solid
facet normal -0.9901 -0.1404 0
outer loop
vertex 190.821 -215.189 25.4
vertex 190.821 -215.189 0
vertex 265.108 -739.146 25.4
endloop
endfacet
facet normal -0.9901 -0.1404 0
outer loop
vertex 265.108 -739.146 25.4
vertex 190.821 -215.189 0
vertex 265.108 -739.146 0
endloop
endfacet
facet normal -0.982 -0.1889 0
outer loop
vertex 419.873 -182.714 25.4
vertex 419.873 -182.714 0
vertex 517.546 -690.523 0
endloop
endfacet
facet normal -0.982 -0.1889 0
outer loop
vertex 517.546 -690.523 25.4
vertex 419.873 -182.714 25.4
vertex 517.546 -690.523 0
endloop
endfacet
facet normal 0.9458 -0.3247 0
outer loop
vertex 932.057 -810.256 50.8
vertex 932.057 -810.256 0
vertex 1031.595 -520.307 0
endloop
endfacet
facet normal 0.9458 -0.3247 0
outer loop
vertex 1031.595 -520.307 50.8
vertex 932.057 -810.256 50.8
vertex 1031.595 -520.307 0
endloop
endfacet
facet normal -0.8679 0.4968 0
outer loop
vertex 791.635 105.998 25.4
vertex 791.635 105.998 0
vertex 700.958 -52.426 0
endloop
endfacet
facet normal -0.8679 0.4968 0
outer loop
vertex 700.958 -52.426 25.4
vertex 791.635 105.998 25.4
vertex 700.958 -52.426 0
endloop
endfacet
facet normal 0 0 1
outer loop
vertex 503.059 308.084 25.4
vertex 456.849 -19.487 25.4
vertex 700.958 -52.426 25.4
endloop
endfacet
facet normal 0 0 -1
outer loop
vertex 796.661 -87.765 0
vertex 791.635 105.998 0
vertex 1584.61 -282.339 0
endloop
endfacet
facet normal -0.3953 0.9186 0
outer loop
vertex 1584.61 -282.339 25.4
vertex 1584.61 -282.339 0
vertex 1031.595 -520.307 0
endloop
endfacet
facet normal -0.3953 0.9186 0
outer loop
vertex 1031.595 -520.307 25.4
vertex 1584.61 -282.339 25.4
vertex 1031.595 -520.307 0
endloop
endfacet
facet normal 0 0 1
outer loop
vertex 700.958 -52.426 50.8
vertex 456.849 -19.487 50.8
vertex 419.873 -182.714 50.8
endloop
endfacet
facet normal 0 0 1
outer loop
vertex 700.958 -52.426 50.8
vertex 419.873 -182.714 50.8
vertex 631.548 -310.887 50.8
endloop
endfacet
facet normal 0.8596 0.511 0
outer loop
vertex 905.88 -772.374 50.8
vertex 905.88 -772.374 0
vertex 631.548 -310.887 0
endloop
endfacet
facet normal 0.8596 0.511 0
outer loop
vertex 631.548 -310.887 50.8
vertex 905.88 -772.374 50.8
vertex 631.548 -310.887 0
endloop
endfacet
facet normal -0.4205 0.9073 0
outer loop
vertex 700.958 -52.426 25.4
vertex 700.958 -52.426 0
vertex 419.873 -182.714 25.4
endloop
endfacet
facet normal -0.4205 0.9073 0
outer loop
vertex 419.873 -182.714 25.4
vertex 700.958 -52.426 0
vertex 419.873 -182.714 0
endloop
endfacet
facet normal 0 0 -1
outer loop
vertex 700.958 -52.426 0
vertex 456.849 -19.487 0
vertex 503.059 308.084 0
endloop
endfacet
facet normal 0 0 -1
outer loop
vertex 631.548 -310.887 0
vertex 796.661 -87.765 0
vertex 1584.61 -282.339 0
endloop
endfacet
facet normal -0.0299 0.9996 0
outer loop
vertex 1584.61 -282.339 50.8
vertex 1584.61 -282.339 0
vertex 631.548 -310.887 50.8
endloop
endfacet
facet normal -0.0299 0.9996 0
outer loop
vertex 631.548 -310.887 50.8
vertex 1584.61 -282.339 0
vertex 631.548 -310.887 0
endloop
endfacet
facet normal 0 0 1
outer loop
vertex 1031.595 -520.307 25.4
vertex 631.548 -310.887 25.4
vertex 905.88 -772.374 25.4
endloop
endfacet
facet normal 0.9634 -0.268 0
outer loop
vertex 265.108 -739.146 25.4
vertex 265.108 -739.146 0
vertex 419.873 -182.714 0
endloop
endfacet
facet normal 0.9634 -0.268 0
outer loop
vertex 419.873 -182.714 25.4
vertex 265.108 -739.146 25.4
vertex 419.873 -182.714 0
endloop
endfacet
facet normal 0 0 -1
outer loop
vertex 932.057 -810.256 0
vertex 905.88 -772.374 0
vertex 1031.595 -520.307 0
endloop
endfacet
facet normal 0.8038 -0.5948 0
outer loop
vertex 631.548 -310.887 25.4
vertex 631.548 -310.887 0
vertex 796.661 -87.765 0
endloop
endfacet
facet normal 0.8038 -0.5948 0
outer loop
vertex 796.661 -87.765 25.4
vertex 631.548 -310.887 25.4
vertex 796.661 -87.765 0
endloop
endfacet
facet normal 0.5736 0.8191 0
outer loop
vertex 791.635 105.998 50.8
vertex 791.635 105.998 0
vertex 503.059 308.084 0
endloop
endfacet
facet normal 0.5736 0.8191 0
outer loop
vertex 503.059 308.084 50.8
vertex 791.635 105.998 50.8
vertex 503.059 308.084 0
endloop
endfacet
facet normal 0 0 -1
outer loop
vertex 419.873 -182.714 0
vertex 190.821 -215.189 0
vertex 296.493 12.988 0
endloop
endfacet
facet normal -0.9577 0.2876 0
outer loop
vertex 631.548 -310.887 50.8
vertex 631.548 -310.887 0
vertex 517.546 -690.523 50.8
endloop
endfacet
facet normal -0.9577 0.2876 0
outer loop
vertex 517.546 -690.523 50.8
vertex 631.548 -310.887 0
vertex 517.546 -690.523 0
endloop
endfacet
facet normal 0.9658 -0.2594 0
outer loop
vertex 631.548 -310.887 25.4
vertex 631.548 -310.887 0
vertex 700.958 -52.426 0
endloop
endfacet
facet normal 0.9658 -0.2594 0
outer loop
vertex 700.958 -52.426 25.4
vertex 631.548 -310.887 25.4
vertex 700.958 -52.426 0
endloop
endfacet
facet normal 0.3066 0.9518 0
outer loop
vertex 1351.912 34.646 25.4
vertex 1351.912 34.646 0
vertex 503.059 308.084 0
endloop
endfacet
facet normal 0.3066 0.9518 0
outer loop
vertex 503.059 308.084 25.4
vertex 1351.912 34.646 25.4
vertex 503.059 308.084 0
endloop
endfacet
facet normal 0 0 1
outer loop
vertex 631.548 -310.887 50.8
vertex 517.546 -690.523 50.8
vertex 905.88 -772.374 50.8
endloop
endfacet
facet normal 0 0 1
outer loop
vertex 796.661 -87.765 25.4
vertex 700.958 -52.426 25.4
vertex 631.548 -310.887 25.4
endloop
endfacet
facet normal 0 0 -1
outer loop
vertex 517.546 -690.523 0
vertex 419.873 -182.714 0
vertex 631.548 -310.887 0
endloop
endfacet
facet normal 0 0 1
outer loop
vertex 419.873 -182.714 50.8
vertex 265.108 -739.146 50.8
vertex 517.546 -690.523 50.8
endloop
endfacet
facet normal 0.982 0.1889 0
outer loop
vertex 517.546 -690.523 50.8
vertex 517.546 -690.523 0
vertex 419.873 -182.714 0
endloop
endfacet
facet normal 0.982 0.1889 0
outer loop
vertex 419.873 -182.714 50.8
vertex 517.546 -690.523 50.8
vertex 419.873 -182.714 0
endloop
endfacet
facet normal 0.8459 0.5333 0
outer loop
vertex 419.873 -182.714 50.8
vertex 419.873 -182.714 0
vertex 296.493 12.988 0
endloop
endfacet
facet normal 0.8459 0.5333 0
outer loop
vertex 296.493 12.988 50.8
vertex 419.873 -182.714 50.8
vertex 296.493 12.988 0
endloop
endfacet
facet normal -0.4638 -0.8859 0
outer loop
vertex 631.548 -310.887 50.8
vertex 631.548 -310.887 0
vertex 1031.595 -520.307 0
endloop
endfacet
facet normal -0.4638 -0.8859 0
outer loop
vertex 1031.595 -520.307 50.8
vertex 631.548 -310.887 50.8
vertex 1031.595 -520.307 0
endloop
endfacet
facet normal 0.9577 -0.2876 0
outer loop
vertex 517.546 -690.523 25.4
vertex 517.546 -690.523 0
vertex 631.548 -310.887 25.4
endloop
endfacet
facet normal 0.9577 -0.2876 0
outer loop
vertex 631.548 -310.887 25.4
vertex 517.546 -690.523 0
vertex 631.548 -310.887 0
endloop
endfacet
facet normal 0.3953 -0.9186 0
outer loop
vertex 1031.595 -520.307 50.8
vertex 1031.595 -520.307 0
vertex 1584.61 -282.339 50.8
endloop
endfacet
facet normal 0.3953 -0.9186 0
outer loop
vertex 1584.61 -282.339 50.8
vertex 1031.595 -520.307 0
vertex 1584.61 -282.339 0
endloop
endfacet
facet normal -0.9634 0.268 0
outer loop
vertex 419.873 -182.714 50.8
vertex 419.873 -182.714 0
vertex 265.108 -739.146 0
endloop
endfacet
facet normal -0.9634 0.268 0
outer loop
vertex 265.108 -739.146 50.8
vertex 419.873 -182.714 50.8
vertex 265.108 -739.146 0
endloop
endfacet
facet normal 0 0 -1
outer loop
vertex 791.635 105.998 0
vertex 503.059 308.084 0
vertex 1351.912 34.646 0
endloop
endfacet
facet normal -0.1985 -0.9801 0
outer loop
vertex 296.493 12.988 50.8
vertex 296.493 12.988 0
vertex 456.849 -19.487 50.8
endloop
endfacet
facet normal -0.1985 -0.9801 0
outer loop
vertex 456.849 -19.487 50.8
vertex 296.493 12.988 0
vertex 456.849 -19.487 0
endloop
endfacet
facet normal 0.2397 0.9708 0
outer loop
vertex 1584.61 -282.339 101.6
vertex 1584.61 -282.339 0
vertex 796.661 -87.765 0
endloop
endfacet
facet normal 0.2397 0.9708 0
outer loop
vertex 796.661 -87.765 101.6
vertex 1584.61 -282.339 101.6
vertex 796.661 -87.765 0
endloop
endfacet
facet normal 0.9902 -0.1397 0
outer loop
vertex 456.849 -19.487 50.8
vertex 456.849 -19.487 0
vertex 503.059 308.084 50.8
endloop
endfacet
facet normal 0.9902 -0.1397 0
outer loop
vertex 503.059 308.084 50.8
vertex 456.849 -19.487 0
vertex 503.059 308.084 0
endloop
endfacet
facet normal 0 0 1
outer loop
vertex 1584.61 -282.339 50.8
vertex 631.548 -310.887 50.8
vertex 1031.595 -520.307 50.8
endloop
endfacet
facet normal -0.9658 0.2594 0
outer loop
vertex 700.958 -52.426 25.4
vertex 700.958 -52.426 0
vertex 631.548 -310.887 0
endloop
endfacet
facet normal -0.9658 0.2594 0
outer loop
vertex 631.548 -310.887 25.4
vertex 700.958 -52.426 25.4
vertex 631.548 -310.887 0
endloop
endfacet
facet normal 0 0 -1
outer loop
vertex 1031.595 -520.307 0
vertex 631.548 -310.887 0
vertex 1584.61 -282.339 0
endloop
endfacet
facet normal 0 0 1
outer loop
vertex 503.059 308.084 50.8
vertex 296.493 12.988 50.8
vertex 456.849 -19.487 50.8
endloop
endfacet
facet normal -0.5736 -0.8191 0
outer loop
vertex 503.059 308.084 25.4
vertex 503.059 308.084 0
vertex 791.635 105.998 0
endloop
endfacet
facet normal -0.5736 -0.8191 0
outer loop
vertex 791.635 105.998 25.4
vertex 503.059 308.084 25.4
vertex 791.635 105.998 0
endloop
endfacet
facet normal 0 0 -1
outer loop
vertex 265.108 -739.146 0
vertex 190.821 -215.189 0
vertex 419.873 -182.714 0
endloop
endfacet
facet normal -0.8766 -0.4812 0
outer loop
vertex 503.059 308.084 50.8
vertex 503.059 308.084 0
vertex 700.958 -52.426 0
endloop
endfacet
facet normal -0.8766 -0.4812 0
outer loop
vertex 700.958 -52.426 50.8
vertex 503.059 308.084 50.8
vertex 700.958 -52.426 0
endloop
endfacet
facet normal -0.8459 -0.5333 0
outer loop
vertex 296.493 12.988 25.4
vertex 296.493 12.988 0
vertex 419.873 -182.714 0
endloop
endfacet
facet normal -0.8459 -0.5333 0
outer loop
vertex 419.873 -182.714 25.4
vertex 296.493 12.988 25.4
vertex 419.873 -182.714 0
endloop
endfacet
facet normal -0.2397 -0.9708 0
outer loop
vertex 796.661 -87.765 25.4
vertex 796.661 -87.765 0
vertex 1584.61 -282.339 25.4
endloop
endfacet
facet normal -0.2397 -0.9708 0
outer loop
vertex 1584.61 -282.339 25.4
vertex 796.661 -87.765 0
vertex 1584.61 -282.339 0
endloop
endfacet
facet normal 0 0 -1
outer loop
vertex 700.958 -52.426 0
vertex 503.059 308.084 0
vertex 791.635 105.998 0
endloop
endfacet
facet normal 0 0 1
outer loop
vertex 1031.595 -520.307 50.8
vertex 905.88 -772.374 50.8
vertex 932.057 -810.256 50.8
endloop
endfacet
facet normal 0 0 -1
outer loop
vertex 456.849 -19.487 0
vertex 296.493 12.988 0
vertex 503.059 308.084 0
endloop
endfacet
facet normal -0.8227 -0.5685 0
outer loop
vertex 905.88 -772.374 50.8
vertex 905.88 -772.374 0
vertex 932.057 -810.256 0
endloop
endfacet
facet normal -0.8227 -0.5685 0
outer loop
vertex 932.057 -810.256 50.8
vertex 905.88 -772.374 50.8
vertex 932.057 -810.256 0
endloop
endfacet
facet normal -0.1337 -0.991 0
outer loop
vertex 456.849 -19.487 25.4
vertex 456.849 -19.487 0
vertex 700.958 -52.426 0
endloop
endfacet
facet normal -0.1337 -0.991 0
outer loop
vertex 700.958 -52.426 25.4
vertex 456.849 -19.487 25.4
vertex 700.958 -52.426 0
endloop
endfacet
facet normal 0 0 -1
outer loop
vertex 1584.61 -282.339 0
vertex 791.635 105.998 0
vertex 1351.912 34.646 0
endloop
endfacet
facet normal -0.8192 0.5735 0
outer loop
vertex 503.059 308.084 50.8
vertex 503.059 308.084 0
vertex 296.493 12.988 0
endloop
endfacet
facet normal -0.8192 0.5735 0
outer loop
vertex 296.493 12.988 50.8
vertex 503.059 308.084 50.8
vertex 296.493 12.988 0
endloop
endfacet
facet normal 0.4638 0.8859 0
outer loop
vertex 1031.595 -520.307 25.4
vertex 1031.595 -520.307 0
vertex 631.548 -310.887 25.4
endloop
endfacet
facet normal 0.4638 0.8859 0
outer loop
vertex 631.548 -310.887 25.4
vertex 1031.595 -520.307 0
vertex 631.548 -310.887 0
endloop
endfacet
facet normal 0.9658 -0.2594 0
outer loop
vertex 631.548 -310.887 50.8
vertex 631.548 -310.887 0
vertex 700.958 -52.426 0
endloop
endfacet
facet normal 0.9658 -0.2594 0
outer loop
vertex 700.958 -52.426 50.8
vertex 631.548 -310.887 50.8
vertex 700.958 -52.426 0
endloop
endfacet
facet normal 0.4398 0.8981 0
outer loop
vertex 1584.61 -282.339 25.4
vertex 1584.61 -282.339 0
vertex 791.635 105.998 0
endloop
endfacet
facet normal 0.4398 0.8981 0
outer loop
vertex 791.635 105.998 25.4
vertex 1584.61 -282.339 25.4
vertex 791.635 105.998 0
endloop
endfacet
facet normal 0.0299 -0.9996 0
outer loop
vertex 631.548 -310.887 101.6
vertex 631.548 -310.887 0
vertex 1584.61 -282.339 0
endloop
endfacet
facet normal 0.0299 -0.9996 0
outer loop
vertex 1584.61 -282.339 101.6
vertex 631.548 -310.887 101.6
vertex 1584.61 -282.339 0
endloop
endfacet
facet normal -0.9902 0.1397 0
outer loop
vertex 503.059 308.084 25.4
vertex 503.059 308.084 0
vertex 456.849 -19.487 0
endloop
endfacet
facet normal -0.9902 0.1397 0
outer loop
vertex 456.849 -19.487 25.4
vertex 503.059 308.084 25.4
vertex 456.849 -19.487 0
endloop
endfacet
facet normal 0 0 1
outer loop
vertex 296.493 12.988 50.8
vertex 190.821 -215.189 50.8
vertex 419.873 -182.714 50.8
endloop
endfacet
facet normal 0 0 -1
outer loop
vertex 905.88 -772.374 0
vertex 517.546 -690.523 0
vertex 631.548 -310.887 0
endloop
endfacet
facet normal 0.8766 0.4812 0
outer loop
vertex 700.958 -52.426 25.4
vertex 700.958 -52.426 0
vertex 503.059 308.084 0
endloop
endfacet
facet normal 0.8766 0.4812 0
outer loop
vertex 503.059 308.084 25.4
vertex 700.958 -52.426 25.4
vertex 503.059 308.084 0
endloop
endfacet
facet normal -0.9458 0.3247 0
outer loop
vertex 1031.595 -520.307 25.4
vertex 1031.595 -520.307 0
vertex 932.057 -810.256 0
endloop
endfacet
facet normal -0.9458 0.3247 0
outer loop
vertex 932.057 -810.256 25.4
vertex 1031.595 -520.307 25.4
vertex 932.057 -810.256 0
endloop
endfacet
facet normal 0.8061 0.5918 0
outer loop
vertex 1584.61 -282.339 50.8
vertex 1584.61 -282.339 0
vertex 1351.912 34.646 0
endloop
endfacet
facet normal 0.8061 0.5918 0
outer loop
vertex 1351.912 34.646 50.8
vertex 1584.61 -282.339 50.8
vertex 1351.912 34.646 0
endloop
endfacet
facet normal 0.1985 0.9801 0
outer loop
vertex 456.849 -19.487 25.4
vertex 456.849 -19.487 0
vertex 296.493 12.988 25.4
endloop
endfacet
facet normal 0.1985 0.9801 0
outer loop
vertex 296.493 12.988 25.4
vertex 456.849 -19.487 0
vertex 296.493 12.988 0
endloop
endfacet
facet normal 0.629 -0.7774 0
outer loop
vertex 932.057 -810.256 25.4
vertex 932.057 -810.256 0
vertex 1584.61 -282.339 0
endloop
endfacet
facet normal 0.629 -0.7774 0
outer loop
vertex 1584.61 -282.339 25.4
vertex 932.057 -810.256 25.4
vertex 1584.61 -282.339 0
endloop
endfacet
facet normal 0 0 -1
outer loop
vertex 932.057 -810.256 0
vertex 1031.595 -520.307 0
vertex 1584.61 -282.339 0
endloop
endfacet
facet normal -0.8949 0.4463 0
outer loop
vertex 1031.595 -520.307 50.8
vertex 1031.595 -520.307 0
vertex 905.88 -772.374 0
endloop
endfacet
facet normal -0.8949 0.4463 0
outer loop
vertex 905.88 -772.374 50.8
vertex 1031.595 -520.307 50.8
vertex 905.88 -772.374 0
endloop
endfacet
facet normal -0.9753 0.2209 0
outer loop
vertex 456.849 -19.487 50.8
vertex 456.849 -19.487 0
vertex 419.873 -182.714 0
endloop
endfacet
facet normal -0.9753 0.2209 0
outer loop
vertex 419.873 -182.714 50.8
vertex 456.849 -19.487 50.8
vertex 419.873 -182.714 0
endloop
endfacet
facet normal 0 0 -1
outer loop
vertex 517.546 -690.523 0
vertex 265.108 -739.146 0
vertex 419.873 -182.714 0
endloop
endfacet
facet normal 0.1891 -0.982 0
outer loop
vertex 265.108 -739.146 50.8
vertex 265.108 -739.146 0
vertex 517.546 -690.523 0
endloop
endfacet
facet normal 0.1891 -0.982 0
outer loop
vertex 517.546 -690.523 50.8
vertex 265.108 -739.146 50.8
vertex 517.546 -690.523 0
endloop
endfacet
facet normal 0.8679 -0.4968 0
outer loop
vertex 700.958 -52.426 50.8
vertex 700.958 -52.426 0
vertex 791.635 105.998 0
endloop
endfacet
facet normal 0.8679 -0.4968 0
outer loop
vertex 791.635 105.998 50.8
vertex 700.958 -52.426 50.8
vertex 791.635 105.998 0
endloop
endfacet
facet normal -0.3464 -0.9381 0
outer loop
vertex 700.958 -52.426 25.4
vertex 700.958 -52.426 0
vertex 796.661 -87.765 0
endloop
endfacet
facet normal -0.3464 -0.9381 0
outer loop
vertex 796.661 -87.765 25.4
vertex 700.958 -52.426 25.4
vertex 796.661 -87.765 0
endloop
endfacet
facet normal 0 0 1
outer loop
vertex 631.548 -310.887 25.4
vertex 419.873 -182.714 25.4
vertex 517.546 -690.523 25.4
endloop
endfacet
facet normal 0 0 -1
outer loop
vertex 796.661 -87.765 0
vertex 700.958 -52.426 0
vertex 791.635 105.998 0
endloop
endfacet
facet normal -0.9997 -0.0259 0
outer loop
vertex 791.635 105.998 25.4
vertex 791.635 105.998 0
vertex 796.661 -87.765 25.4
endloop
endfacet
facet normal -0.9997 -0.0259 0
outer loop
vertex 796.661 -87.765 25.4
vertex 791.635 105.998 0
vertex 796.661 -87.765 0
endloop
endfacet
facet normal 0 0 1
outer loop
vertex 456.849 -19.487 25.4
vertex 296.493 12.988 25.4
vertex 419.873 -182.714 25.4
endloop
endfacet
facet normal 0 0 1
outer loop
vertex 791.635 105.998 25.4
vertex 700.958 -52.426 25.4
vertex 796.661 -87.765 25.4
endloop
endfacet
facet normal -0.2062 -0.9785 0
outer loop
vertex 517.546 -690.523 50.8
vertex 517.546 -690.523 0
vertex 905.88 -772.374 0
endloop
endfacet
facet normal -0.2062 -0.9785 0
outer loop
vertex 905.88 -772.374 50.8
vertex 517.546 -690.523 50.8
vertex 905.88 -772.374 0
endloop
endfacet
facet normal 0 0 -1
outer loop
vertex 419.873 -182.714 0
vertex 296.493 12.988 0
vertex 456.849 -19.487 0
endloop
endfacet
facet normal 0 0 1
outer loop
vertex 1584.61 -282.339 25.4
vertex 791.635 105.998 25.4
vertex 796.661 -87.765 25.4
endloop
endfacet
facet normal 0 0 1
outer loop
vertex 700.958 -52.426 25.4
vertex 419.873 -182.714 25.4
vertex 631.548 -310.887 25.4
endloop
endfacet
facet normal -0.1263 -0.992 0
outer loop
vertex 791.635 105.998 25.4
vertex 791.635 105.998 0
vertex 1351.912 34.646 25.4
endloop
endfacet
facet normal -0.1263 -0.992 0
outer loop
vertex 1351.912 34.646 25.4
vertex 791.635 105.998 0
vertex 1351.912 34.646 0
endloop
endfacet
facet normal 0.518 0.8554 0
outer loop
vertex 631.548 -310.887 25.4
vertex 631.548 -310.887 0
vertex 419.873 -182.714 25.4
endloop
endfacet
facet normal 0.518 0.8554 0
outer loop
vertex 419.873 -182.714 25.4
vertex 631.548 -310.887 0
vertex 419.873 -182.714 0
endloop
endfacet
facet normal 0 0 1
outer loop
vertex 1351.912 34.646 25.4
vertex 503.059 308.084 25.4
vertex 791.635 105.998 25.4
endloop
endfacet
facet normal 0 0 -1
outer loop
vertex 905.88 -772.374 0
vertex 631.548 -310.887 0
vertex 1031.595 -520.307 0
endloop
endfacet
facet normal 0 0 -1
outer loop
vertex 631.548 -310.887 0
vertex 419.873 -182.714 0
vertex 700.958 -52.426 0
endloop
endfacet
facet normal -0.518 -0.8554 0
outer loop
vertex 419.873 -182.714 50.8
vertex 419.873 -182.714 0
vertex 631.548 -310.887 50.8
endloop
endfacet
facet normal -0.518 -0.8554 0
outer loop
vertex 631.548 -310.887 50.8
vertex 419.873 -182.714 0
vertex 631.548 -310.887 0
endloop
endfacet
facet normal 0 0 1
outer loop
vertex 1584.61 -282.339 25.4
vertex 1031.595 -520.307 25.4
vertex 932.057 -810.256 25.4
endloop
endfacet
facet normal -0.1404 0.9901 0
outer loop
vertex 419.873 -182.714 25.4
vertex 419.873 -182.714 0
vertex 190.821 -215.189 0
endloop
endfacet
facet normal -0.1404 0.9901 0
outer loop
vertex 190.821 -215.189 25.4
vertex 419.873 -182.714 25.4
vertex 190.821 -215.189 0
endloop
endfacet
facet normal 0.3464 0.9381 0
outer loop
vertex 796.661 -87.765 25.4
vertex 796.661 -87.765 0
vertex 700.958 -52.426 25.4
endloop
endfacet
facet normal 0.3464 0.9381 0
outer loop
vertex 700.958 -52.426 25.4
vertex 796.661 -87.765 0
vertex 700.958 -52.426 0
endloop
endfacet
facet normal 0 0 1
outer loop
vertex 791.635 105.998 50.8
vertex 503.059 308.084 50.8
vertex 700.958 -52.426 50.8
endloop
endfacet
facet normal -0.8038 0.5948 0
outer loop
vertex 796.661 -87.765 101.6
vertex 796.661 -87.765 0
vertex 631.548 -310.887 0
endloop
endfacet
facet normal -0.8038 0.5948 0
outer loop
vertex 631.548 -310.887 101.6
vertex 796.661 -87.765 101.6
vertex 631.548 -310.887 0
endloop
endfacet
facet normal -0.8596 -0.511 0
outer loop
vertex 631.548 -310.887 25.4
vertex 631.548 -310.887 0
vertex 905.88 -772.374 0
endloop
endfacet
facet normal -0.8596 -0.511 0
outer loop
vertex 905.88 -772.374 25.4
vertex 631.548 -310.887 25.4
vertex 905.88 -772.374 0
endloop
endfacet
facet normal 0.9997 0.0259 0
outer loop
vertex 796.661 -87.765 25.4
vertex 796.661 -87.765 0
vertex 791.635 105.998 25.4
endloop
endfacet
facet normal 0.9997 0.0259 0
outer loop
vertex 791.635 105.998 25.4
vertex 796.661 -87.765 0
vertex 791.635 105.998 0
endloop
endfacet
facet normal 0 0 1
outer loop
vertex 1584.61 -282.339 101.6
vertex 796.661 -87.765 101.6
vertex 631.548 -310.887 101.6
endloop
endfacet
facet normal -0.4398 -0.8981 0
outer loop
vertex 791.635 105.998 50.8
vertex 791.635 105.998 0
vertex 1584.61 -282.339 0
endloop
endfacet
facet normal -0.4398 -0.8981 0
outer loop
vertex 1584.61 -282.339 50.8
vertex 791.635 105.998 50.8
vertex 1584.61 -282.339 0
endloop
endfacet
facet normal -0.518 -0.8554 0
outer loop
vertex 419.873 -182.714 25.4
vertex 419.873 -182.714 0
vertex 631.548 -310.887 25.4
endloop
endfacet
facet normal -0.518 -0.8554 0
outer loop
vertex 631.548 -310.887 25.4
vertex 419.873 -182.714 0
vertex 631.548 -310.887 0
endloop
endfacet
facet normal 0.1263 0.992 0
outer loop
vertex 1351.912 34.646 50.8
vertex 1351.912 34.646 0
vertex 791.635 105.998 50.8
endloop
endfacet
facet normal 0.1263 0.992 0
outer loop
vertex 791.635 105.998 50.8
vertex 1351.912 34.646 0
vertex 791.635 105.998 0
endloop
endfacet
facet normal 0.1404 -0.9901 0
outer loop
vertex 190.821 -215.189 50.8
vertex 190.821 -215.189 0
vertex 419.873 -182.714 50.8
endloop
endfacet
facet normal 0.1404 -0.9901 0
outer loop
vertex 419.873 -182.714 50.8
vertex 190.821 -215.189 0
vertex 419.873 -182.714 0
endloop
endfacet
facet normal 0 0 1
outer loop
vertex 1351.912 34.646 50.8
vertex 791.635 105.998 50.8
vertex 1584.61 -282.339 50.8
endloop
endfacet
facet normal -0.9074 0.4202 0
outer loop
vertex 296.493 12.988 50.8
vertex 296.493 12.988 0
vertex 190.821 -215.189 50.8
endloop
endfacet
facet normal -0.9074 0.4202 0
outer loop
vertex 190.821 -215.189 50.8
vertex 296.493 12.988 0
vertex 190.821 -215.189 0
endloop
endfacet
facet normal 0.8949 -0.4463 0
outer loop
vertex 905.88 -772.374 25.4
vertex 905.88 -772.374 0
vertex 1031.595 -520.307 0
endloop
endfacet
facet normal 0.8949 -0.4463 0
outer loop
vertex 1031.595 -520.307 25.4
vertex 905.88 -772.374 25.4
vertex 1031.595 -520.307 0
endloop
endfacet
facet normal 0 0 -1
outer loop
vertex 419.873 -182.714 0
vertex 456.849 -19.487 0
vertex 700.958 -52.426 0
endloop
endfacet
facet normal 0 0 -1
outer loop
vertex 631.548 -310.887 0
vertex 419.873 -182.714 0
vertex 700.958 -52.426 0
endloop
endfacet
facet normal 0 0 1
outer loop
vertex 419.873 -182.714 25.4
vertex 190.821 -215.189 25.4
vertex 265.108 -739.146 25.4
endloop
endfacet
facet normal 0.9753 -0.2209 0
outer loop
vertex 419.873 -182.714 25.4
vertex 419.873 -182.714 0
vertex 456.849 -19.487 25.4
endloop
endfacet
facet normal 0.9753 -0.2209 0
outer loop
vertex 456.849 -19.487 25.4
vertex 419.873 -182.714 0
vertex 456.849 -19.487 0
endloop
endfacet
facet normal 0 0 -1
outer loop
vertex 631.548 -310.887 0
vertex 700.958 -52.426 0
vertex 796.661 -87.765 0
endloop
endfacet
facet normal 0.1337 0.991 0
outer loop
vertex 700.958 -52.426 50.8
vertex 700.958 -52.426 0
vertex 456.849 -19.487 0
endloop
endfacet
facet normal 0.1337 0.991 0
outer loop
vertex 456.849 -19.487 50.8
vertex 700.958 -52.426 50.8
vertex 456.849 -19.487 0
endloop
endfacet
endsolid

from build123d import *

# Parameters (mm, degrees)
F1_DEPTH = 25.4
F2_DEPTH = 50.8
F3_DEPTH = 25.4
F4_DEPTH = 101.6


with BuildPart() as f1:
    # F0 (on Top) → F1 (new body)
    with BuildSketch(Plane.XY):
        Polygon((932.056904, -810.256481), (1584.609509, -282.339096), (1031.59523, -520.306706), align=None)
        Polygon((1031.59523, -520.306706), (631.548345, -310.886502), (905.879974, -772.374153), align=None)
        Polygon((631.548345, -310.886502), (419.873297, -182.713658), (517.546415, -690.522909), align=None)
        Polygon((419.873297, -182.713658), (190.82123, -215.188652), (265.107928, -739.146292), align=None)
        Polygon((456.848562, -19.487321), (296.492636, 12.987666), (419.873297, -182.713658), align=None)
        Polygon((796.661258, -87.764859), (700.958192, -52.426025), (631.548345, -310.886502), align=None)
        Polygon((1584.609509, -282.339096), (791.635275, 105.997652), (796.661258, -87.764859), align=None)
        Polygon((1351.912498, 34.646034), (503.059387, 308.084488), (791.635275, 105.997652), align=None)
        Polygon((503.059387, 308.084488), (456.848562, -19.487321), (700.958192, -52.426025), align=None)
    extrude(amount=F1_DEPTH)


with BuildPart() as f2:
    # F0 (on Top) → F2 (new body)
    with BuildSketch(Plane.XY):
        Polygon((503.059387, 308.084488), (296.492636, 12.987666), (456.848562, -19.487321), align=None)
        Polygon((419.873297, -182.713658), (296.492636, 12.987666), (190.82123, -215.188652), align=None)
        Polygon((456.848562, -19.487321), (419.873297, -182.713658), (700.958192, -52.426025), align=None)
        Polygon((791.635275, 105.997652), (503.059387, 308.084488), (700.958192, -52.426025), align=None)
        Polygon((1351.912498, 34.646034), (791.635275, 105.997652), (1584.609509, -282.339096), align=None)
        Polygon((1584.609509, -282.339096), (631.548345, -310.886502), (1031.59523, -520.306706), align=None)
        Polygon((1031.59523, -520.306706), (905.879974, -772.374153), (932.056904, -810.256481), align=None)
        Polygon((517.546415, -690.522909), (419.873297, -182.713658), (265.107928, -739.146292), align=None)
        Polygon((905.879974, -772.374153), (631.548345, -310.886502), (517.546415, -690.522909), align=None)
        Polygon((700.958192, -52.426025), (419.873297, -182.713658), (631.548345, -310.886502), align=None)
    extrude(amount=F2_DEPTH)


with BuildPart() as f3:
    # F0 (on Top) → F3 (new body)
    with BuildSketch(Plane.XY):
        Polygon((791.635275, 105.997652), (700.958192, -52.426025), (796.661258, -87.764859), align=None)
        Polygon((700.958192, -52.426025), (419.873297, -182.713658), (631.548345, -310.886502), align=None)
    extrude(amount=F3_DEPTH)


with BuildPart() as f4:
    # F0 (on Top) → F4 (new body)
    with BuildSketch(Plane.XY):
        Polygon((796.661258, -87.764859), (631.548345, -310.886502), (1584.609509, -282.339096), align=None)
    extrude(amount=F4_DEPTH)


solid = Compound([f1.part, f2.part, f3.part, f4.part])
